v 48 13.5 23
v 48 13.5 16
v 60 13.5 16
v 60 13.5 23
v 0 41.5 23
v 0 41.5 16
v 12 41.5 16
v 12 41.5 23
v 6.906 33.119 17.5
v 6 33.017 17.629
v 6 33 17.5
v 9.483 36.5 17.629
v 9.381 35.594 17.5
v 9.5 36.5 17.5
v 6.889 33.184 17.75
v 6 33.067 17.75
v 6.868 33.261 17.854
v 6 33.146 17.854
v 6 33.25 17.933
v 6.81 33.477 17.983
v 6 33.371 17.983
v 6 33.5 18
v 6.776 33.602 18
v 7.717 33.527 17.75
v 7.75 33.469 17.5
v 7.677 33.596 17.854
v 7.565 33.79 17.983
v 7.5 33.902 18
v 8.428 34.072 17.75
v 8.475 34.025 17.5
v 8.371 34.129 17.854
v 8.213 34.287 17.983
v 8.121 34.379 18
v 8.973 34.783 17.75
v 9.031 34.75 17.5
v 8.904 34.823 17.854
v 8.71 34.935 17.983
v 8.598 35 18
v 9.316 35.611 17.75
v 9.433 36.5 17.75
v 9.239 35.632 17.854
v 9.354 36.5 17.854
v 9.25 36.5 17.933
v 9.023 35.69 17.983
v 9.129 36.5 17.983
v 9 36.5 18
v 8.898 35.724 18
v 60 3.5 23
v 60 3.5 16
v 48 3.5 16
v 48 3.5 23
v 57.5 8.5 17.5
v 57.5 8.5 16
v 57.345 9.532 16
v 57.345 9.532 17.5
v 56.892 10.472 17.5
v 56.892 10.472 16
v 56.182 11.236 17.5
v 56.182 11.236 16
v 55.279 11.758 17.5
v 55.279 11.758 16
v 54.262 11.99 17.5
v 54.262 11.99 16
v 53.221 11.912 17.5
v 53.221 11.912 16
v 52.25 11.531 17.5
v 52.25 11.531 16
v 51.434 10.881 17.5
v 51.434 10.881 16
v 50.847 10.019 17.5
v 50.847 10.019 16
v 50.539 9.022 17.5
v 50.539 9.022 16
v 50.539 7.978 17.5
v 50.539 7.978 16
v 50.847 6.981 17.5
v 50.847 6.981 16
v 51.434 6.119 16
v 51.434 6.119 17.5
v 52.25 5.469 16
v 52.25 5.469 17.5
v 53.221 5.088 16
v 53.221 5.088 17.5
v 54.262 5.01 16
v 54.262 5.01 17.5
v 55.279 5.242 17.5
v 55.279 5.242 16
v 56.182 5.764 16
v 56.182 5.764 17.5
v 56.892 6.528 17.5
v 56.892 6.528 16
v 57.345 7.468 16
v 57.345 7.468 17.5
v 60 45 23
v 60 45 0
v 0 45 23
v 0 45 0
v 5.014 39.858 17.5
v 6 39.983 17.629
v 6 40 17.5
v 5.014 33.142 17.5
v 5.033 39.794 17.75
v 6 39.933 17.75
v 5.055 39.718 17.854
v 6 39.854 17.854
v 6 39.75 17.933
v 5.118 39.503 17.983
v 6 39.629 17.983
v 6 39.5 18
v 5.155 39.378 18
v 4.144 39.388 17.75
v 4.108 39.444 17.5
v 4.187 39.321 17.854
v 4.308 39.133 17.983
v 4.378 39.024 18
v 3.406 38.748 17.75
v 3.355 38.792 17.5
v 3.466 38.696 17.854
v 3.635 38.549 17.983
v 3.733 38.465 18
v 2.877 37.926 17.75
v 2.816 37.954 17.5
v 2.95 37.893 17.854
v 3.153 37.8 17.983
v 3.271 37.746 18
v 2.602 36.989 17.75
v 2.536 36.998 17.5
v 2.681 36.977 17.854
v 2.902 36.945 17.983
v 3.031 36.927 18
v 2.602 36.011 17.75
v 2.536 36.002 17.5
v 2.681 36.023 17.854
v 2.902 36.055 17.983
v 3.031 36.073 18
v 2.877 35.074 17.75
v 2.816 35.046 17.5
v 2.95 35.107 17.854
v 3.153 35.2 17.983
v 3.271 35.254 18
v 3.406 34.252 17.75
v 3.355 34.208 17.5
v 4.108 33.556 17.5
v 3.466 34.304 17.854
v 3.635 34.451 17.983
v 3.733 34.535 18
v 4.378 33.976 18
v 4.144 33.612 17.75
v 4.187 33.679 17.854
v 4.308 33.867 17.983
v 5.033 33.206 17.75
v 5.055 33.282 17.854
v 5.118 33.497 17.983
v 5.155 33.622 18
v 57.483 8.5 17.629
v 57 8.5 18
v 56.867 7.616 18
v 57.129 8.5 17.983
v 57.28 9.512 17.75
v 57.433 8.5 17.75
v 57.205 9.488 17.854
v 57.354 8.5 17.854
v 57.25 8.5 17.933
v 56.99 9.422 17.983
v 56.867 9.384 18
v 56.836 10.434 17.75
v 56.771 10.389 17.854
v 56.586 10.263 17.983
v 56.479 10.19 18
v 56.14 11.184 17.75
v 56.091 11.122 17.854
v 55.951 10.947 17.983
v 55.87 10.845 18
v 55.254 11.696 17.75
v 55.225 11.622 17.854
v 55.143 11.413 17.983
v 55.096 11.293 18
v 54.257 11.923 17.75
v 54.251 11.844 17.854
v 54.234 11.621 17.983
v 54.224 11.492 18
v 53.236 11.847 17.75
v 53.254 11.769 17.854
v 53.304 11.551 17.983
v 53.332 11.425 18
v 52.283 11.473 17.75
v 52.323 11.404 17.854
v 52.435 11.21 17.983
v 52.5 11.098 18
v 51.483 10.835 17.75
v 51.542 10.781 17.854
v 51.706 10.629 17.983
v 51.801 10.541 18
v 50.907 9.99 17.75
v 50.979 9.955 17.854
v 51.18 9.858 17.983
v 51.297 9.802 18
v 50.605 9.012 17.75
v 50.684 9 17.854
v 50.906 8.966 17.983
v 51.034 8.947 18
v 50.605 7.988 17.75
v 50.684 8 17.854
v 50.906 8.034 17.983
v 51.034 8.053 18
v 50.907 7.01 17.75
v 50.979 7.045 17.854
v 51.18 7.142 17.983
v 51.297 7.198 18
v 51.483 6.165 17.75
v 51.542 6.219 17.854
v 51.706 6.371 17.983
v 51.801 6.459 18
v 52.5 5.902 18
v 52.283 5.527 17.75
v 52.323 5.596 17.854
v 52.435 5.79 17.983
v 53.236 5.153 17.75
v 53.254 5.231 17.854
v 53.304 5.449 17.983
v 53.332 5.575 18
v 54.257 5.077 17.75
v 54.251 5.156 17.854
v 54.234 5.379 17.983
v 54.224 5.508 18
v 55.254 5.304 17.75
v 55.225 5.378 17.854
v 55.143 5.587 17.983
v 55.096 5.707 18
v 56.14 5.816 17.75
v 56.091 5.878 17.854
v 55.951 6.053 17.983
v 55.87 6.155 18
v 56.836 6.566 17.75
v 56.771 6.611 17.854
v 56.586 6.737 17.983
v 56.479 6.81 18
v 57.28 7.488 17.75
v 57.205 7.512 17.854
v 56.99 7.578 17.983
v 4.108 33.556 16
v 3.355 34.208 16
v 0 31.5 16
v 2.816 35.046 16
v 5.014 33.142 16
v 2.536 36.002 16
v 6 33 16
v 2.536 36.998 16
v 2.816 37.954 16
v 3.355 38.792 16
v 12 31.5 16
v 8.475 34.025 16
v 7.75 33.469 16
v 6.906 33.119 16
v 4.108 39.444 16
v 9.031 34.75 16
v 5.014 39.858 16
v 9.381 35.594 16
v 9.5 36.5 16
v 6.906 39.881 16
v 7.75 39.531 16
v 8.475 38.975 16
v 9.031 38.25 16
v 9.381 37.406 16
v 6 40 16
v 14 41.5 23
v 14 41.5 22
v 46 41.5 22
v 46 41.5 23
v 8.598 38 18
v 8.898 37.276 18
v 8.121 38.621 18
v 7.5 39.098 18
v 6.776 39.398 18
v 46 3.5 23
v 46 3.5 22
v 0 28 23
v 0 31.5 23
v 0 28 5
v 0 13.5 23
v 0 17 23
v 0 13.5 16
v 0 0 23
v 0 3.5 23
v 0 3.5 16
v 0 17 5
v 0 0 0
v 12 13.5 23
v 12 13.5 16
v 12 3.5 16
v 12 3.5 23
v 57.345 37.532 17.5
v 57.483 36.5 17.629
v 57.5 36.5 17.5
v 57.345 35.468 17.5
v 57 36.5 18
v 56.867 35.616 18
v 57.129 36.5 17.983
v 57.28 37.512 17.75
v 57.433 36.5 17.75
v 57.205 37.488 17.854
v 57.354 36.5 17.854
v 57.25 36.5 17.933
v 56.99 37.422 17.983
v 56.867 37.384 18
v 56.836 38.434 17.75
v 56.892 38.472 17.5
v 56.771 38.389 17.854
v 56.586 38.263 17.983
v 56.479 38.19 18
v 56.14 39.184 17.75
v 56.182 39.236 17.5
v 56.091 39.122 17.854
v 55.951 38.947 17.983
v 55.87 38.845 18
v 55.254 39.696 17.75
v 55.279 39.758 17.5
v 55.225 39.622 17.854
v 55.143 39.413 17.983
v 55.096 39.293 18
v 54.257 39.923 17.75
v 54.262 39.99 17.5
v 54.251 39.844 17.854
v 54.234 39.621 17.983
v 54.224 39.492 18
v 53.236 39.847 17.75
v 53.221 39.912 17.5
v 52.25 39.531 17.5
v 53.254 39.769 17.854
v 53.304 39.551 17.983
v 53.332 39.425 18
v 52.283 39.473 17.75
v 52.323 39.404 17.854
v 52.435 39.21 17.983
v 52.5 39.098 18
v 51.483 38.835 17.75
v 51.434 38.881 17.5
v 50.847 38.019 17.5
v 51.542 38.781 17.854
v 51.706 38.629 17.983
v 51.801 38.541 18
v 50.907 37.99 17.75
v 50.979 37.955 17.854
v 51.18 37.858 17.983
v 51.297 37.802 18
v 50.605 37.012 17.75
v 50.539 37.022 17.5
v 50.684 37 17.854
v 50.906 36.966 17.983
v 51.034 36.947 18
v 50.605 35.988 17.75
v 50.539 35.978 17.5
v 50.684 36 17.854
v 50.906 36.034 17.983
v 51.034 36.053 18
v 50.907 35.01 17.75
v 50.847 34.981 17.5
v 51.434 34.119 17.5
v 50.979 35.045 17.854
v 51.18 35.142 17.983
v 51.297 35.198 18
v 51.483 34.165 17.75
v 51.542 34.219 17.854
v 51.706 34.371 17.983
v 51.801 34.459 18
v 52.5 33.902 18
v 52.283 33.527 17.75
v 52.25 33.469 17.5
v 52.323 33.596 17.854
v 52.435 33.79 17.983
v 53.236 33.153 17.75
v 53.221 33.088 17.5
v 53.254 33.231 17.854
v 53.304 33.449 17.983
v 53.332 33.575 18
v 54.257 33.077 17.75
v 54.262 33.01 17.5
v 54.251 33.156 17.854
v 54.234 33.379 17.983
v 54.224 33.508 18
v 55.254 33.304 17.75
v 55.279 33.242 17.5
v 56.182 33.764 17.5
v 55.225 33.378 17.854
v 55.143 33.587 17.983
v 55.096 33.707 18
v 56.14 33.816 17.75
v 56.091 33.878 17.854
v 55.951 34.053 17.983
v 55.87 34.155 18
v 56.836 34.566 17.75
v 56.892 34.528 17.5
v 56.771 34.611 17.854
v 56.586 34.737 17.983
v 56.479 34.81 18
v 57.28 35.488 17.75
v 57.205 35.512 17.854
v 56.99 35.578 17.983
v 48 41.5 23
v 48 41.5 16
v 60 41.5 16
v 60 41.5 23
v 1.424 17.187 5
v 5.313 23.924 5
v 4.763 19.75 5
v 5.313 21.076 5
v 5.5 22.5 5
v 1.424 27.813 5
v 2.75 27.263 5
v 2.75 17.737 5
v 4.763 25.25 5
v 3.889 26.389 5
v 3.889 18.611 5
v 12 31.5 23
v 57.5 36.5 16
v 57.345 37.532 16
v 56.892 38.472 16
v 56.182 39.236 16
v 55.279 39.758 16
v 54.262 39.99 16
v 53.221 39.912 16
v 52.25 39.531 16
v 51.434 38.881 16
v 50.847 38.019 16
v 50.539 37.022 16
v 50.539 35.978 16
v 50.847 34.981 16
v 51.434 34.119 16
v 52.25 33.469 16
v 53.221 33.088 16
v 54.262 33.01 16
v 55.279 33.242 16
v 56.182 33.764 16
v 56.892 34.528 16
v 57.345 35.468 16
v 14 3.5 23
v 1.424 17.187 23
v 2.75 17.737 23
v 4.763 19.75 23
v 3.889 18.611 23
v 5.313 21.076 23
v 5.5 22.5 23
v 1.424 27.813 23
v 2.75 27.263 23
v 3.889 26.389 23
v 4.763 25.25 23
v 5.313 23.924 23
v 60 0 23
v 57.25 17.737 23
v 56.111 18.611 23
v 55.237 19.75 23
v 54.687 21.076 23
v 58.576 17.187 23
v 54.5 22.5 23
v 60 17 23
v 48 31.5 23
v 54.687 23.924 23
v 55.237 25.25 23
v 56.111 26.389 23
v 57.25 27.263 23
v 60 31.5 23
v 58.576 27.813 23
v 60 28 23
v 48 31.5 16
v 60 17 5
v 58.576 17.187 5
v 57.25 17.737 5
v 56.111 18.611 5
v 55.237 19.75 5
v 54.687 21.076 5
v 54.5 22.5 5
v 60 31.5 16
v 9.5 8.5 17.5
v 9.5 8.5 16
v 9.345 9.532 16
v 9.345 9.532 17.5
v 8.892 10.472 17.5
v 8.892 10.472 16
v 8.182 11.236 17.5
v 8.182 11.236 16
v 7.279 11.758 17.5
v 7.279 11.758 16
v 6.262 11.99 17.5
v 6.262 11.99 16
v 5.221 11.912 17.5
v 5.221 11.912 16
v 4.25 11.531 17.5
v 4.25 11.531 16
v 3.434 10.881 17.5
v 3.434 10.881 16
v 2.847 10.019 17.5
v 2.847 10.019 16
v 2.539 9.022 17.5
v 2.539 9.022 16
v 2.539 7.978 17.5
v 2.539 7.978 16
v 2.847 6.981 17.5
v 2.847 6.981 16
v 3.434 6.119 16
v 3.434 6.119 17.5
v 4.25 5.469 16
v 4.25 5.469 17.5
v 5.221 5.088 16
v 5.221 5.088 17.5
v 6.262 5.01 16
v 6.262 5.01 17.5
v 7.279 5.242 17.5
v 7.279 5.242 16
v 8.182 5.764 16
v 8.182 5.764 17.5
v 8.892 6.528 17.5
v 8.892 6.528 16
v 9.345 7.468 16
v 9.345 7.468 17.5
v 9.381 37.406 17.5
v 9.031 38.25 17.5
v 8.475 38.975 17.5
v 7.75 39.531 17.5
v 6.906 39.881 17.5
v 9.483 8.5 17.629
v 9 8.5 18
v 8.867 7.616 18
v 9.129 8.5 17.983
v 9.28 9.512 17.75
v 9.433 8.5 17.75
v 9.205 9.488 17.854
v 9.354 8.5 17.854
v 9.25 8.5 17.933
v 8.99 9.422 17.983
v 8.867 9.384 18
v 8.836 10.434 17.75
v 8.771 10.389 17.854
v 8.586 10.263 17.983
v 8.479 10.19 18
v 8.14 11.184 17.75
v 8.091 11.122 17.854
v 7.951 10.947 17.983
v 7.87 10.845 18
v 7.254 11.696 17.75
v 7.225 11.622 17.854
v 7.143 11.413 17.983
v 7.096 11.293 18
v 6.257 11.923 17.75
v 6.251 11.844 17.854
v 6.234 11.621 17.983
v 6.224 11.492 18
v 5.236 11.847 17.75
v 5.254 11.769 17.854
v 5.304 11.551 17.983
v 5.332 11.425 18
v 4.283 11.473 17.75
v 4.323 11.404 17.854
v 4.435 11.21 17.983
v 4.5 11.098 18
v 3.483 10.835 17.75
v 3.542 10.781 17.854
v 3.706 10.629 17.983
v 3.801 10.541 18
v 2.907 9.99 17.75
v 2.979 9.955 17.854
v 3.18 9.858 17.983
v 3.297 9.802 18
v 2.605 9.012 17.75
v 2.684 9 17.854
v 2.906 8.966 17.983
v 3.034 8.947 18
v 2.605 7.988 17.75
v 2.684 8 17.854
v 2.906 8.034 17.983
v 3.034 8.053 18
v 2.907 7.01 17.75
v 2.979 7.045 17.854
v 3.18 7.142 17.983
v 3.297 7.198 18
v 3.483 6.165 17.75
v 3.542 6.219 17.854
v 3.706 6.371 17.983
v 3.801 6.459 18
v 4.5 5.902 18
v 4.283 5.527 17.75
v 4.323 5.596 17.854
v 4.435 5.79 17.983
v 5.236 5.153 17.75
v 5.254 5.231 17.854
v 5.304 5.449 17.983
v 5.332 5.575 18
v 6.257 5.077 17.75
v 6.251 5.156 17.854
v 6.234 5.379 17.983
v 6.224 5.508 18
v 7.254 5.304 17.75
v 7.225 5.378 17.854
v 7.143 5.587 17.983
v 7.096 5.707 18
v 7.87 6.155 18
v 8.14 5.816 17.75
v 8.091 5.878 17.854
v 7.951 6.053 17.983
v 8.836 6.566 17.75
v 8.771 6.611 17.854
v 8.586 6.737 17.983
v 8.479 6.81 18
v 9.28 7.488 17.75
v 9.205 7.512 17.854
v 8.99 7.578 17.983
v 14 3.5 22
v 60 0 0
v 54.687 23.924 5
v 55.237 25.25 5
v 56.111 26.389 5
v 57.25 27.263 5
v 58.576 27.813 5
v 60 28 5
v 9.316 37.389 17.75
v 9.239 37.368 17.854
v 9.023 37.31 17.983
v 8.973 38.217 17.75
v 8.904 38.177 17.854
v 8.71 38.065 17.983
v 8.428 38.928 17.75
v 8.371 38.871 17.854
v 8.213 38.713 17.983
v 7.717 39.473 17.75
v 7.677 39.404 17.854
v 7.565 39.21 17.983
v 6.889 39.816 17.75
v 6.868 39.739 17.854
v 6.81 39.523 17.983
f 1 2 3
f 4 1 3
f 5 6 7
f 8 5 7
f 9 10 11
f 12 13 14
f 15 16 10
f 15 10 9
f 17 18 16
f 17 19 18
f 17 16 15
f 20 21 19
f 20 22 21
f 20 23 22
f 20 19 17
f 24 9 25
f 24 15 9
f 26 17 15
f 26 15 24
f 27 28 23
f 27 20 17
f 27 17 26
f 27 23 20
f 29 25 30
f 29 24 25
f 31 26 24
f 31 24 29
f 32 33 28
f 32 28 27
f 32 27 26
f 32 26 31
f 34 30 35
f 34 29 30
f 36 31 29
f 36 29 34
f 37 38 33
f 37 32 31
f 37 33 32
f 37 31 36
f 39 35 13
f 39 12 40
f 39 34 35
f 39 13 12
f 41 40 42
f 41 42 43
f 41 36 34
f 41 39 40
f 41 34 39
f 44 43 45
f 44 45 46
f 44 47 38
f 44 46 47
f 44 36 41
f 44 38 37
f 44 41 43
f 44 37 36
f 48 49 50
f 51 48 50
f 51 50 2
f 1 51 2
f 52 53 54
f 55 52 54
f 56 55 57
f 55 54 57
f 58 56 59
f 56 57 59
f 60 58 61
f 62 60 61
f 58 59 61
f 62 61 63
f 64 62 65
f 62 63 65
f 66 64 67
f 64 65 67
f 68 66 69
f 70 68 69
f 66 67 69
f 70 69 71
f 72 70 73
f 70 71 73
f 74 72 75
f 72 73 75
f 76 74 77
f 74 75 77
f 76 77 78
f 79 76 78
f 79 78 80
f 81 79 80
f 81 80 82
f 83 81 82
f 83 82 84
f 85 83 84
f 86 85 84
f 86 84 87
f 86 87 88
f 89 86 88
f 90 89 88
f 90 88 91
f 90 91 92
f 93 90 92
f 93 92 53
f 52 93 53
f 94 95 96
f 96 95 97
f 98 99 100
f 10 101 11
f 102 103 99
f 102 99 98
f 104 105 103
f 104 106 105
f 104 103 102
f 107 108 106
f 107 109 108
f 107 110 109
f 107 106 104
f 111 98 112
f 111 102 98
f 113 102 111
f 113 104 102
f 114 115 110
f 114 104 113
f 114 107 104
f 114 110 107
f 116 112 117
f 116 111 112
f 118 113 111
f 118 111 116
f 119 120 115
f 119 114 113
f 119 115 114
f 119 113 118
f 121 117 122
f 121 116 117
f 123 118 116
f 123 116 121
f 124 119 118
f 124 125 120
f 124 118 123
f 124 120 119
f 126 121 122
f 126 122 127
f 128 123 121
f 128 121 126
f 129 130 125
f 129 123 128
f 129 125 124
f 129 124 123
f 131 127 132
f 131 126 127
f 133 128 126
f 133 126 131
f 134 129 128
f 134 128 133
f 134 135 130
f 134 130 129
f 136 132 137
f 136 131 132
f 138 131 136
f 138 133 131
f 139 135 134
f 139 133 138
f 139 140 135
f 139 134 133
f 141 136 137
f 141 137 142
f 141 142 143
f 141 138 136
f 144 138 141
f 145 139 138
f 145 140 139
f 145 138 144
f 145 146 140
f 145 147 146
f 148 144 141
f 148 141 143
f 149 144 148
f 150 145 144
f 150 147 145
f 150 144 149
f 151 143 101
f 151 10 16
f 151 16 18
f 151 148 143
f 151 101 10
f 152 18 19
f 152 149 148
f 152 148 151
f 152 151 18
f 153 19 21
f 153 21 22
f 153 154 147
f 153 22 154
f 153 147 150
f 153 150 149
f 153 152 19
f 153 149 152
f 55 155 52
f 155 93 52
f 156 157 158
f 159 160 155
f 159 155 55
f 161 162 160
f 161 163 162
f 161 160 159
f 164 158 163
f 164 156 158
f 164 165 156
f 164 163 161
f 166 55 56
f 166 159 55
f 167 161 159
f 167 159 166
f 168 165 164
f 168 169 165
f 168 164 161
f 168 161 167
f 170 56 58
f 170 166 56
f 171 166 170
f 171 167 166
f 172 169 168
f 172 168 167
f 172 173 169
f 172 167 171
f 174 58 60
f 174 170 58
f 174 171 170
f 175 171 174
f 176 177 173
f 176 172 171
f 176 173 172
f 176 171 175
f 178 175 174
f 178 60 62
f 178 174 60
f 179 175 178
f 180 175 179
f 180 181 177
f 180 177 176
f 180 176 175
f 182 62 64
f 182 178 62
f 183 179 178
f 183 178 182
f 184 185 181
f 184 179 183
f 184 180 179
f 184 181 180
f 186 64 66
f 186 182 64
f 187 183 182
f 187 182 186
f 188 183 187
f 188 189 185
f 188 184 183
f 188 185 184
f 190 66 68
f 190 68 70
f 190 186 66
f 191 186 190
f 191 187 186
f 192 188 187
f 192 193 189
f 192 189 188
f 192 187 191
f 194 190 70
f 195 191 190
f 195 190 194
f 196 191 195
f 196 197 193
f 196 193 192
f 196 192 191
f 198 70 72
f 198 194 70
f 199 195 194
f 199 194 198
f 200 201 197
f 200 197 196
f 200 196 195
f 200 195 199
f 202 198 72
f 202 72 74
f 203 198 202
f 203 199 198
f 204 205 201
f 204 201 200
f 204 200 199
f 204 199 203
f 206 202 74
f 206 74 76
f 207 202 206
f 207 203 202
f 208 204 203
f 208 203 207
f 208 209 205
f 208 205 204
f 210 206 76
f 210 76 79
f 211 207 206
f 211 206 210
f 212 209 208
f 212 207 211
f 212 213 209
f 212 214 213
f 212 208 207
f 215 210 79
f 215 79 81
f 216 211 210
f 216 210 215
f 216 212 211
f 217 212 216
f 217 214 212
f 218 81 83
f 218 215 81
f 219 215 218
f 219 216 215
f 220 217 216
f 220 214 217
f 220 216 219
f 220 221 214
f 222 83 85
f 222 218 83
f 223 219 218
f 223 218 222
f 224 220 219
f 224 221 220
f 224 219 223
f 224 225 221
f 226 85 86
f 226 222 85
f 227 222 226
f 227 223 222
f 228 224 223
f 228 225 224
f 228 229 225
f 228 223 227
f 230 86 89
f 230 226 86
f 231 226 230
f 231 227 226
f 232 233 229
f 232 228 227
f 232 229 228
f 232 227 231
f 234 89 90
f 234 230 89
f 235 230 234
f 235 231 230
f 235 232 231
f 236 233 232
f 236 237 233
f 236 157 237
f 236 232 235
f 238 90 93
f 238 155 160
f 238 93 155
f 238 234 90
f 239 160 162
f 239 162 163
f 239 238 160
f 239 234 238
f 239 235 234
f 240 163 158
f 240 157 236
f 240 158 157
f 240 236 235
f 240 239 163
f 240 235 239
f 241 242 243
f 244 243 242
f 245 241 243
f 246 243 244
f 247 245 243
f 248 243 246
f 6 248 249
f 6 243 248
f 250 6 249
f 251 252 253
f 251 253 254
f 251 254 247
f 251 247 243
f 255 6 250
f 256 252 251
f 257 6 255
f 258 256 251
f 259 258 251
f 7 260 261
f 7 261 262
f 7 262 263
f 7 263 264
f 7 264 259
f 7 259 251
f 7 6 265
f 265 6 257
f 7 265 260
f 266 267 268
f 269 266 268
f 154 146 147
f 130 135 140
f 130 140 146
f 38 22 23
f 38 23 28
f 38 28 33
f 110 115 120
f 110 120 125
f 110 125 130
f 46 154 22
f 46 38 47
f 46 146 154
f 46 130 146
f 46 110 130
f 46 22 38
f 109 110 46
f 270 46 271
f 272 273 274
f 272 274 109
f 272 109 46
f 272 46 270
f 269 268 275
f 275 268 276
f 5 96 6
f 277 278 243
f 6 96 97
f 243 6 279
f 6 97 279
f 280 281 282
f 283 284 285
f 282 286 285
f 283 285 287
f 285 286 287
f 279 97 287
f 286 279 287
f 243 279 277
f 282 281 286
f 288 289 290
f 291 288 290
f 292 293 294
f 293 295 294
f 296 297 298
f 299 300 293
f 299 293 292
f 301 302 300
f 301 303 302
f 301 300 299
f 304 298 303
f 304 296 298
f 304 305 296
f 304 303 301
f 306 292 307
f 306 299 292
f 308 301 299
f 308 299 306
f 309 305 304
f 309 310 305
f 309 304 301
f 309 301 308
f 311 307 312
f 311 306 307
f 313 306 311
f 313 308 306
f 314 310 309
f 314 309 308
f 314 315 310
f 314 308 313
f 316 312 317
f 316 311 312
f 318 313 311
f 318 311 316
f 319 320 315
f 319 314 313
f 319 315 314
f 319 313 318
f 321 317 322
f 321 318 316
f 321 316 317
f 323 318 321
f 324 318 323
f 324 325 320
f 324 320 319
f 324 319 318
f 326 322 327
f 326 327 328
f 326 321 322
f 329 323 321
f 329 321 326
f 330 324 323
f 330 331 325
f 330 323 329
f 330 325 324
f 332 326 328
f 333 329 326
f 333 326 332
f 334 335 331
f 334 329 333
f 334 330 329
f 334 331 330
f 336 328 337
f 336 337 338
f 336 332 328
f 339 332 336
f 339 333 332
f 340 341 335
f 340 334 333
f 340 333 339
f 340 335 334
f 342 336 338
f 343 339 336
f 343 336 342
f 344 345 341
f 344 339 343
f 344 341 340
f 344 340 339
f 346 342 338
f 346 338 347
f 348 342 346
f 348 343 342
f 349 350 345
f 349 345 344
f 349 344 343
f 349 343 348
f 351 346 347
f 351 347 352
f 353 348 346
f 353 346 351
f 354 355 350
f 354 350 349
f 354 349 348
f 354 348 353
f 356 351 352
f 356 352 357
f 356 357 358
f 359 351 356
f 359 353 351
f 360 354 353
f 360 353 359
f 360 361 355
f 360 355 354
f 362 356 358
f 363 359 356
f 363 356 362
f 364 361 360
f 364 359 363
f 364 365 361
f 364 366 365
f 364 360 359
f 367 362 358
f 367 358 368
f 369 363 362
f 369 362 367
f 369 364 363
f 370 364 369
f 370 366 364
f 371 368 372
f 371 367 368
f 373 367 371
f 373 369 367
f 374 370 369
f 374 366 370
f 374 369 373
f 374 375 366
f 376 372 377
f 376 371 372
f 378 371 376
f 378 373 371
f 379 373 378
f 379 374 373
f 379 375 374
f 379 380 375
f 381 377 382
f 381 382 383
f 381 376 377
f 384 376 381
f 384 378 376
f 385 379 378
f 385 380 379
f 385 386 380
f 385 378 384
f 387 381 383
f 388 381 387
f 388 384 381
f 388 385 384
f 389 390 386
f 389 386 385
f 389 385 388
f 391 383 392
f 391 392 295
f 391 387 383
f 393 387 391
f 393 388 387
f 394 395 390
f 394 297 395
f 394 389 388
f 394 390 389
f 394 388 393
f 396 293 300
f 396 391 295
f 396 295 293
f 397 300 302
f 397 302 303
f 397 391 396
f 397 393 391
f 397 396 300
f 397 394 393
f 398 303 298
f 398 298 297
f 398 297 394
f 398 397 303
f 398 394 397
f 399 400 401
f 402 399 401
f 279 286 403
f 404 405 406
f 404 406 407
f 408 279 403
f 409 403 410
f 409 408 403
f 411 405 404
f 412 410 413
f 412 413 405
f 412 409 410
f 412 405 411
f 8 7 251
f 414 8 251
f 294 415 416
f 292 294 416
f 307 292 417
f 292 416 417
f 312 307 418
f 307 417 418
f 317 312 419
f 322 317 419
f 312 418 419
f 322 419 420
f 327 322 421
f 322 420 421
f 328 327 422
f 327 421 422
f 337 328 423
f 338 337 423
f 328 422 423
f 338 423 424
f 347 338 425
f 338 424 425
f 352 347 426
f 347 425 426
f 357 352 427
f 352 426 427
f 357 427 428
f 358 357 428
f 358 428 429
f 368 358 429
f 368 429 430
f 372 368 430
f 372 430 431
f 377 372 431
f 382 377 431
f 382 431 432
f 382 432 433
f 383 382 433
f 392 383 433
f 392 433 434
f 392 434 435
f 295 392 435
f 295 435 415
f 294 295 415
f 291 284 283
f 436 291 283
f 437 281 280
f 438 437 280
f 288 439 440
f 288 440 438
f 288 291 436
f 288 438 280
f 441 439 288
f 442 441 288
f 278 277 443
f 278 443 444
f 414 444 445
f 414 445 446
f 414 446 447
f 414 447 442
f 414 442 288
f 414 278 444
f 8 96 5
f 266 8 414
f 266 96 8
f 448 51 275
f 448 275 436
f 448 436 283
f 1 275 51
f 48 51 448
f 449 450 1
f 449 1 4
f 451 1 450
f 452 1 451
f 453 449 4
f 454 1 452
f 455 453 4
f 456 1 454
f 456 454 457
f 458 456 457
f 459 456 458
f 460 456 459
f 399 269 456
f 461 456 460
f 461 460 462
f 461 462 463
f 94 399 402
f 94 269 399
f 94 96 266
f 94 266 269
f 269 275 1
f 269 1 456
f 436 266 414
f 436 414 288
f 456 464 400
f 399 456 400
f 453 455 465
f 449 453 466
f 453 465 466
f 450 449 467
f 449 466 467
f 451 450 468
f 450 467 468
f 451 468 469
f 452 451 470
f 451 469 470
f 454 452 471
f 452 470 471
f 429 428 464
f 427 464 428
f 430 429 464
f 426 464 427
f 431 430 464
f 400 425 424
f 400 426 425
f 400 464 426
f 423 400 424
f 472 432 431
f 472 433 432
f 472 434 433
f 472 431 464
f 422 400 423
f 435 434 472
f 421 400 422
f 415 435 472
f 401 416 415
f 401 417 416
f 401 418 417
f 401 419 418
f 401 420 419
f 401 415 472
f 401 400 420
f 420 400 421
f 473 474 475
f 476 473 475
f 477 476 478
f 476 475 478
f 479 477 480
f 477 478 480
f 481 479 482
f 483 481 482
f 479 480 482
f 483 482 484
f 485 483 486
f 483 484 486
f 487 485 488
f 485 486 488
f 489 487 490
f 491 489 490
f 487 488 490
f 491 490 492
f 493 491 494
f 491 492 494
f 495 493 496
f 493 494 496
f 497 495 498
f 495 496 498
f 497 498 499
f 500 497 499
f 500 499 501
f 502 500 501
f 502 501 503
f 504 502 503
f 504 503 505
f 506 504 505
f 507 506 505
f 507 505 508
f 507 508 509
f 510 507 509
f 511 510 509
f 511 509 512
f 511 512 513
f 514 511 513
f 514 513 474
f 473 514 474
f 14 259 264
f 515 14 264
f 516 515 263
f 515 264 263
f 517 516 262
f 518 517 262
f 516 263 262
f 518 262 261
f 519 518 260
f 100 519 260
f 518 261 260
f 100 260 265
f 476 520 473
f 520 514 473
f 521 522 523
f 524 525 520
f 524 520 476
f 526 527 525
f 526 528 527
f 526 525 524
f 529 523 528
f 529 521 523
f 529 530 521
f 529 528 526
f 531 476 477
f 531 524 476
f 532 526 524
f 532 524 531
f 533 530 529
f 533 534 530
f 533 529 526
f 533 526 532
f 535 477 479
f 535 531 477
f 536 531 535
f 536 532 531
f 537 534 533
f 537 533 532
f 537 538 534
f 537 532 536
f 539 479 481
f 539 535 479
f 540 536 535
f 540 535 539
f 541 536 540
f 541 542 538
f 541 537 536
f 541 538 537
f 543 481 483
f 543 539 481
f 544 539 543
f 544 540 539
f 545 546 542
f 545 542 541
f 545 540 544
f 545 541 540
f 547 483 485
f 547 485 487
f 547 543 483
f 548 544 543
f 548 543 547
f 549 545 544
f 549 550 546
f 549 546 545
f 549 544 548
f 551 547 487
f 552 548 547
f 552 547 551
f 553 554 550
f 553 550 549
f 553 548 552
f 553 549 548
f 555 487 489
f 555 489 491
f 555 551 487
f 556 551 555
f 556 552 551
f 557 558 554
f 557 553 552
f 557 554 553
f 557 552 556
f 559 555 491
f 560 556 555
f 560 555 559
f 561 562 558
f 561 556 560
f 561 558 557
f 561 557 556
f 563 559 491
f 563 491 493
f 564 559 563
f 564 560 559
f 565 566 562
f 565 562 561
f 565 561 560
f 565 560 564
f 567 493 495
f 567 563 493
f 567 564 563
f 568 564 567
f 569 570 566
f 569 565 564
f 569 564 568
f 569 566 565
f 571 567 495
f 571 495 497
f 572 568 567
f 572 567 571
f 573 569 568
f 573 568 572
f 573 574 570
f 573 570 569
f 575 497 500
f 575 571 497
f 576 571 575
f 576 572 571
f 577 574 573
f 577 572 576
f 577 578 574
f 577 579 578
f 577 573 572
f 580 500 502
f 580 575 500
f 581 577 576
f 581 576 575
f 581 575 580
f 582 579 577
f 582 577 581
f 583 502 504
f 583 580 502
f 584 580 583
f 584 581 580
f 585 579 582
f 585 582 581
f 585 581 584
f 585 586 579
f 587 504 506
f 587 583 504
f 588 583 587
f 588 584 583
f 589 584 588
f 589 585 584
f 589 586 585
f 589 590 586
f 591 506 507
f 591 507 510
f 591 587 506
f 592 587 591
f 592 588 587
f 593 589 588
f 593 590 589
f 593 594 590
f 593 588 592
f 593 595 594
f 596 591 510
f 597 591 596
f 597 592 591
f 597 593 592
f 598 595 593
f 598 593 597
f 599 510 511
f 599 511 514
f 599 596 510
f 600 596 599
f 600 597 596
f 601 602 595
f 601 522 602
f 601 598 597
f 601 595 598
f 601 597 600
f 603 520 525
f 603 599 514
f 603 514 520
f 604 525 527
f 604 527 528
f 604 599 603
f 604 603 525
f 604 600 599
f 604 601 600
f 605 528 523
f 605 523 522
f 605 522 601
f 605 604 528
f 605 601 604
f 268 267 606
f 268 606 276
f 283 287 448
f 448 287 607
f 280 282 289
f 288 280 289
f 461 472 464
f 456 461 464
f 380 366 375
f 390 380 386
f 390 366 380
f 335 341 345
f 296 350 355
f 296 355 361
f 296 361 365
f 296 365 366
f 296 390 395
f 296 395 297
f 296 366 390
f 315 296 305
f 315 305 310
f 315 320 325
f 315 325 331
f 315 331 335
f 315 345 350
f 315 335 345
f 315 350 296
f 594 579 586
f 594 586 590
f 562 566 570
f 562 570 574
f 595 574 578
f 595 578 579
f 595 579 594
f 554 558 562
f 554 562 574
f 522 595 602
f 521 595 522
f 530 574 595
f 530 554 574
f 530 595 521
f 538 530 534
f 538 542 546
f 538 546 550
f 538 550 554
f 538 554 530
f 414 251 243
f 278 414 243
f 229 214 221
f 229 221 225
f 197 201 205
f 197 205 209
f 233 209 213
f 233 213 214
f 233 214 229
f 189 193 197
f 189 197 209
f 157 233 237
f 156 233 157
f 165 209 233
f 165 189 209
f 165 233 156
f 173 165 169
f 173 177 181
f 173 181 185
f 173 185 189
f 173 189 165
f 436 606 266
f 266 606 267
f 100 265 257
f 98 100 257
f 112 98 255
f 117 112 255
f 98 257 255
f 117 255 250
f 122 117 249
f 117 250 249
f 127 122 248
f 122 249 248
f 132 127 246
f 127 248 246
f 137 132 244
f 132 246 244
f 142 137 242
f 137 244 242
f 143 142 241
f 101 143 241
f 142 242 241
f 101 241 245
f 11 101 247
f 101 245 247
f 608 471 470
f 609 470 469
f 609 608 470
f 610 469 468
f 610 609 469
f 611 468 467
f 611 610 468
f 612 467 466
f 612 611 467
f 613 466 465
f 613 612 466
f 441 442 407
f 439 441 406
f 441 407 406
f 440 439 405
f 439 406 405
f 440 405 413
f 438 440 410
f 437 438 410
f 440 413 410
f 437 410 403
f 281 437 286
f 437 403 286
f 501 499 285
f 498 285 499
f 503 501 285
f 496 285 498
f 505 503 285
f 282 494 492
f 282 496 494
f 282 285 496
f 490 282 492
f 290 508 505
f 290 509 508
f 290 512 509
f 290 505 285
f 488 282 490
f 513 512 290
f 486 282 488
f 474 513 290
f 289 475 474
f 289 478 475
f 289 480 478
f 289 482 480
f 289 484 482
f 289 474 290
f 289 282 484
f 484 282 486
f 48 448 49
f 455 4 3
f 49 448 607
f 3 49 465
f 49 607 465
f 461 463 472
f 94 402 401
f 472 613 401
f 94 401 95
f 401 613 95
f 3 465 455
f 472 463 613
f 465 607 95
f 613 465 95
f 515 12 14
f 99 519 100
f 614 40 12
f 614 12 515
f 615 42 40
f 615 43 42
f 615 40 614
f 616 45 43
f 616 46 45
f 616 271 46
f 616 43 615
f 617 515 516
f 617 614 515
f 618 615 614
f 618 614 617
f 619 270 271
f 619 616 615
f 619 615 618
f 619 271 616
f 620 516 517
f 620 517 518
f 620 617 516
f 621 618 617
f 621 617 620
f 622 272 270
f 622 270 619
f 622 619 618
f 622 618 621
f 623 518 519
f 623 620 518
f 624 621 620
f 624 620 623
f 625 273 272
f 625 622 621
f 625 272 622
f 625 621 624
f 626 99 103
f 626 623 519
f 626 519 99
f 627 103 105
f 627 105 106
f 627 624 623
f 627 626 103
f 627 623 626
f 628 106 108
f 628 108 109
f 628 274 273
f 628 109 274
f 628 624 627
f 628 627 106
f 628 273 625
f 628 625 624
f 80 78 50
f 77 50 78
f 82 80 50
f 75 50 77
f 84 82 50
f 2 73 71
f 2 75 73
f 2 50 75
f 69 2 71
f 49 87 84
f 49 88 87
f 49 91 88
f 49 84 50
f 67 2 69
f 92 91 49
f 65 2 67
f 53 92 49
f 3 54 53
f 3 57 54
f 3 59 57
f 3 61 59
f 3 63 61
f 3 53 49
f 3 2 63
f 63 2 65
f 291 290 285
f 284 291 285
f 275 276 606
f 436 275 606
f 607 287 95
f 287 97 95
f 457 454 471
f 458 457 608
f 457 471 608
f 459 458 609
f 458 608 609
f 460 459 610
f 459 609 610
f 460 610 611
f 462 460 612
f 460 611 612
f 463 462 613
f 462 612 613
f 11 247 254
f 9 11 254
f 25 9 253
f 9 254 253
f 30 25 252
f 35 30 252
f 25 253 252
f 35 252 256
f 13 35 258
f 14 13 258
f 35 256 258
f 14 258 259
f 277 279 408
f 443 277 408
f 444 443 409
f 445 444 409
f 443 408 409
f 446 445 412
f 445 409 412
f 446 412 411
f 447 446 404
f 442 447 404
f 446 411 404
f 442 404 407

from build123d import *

# Parameters (mm, degrees)
F1_DEPTH = 23
F2_DEPTH = 22
F0_W     = 12
F0_H     = 10
F0_R     = 3.5
F3_DEPTH = 16
F4_DEPTH = 18
F5_R     = 0.5
F6_DEPTH = 5


with BuildPart() as f1:
    # F0 (on Top) → F1 (new body)
    with BuildSketch(Plane.XY):
        with BuildLine():
            Line((60, 45), (30, 45))
            Line((30, 45), (30, 41.5))
            Line((30, 41.5), (46, 41.5))
            Line((46, 41.5), (46, 31.5))
            Line((46, 31.5), (46, 22.5))
            Line((46, 22.5), (54.5, 22.5))
            ThreePointArc((54.5, 22.5), (56.1109127035, 26.3890872965), (60, 28))
            Line((60, 28), (60, 31.5))
            Line((60, 31.5), (48, 31.5))
            Line((48, 31.5), (48, 41.5))
            Line((48, 41.5), (60, 41.5))
            Line((60, 41.5), (60, 45))
        make_face()
        with BuildLine():
            Line((54.5, 22.5), (46, 22.5))
            Line((46, 22.5), (46, 13.5))
            Line((46, 13.5), (46, 3.5))
            Line((46, 3.5), (30, 3.5))
            Line((30, 3.5), (30, 0))
            Line((30, 0), (60, 0))
            Line((60, 0), (60, 3.5))
            Line((60, 3.5), (48, 3.5))
            Line((48, 3.5), (48, 13.5))
            Line((48, 13.5), (60, 13.5))
            Line((60, 13.5), (60, 17))
            ThreePointArc((60, 17), (56.1109127035, 18.6109127035), (54.5, 22.5))
        make_face()
        with BuildLine():
            Line((14, 13.5), (14, 22.5))
            Line((14, 22.5), (5.5, 22.5))
            ThreePointArc((5.5, 22.5), (3.8890872965, 18.6109127035), (0, 17))
            Line((0, 17), (0, 13.5))
            Line((0, 13.5), (12, 13.5))
            Line((12, 13.5), (12, 3.5))
            Line((12, 3.5), (0, 3.5))
            Line((0, 3.5), (0, 0))
            Line((0, 0), (30, 0))
            Line((30, 0), (30, 3.5))
            Line((30, 3.5), (14, 3.5))
            Line((14, 3.5), (14, 13.5))
        make_face()
        with BuildLine():
            Line((30, 45), (0, 45))
            Line((0, 45), (0, 41.5))
            Line((0, 41.5), (6, 41.5))
            Line((6, 41.5), (12, 41.5))
            Line((12, 41.5), (12, 31.5))
            Line((12, 31.5), (6, 31.5))
            Line((6, 31.5), (0, 31.5))
            Line((0, 31.5), (0, 28))
            ThreePointArc((0, 28), (3.8890872965, 26.3890872965), (5.5, 22.5))
            Line((5.5, 22.5), (14, 22.5))
            Line((14, 22.5), (14, 31.5))
            Line((14, 31.5), (14, 41.5))
            Line((14, 41.5), (30, 41.5))
            Line((30, 41.5), (30, 45))
        make_face()
    extrude(amount=F1_DEPTH)

    # F0 (on Top) → F2 (join)
    with BuildSketch(Plane.XY):
        Polygon((30, 22.5), (30, 41.5), (14, 41.5), (14, 31.5), (14, 22.5), align=None)
        Polygon((46, 41.5), (30, 41.5), (30, 22.5), (46, 22.5), (46, 31.5), align=None)
        Polygon((46, 22.5), (30, 22.5), (30, 3.5), (46, 3.5), (46, 13.5), align=None)
        Polygon((30, 3.5), (30, 22.5), (14, 22.5), (14, 13.5), (14, 3.5), align=None)
    extrude(amount=F2_DEPTH)

    # F0 (on Top) → F3 (join)
    with BuildSketch(Plane.XY):
        with BuildLine():
            Line((6, 41.5), (0, 41.5))
            Line((0, 41.5), (0, 31.5))
            Line((0, 31.5), (6, 31.5))
            Line((6, 31.5), (6, 33))
            ThreePointArc((6, 33), (2.5, 36.5), (6, 40))
            Line((6, 40), (6, 41.5))
        make_face()
        with BuildLine():
            Line((12, 41.5), (6, 41.5))
            Line((6, 41.5), (6, 40))
            ThreePointArc((6, 40), (8.4748737342, 38.9748737342), (9.5, 36.5))
            ThreePointArc((9.5, 36.5), (8.4748737342, 34.0251262658), (6, 33))
            Line((6, 33), (6, 31.5))
            Line((6, 31.5), (12, 31.5))
            Line((12, 31.5), (12, 41.5))
        make_face()
        with Locations((6, 8.5)):
            Rectangle(F0_W, F0_H)
        with Locations((6, 8.5)):
            Circle(F0_R, mode=Mode.SUBTRACT)
        with Locations((54, 36.5)):
            Rectangle(F0_W, F0_H)
        with Locations((54, 36.5)):
            Circle(F0_R, mode=Mode.SUBTRACT)
        with Locations((54, 8.5)):
            Rectangle(F0_W, F0_H)
        with Locations((54, 8.5)):
            Circle(F0_R, mode=Mode.SUBTRACT)
    extrude(amount=F3_DEPTH)

    # F0 (on Top) → F4 (join)
    with BuildSketch(Plane.XY):
        with BuildLine():
            ThreePointArc((9.5, 36.5), (8.4748737342, 38.9748737342), (6, 40))
            Line((6, 40), (6, 33))
            ThreePointArc((6, 33), (8.4748737342, 34.0251262658), (9.5, 36.5))
        make_face()
        with BuildLine():
            Line((6, 33), (6, 40))
            ThreePointArc((6, 40), (2.5, 36.5), (6, 33))
        make_face()
        with Locations((6, 8.5)):
            Circle(F0_R)
        with Locations((54, 36.5)):
            Circle(F0_R)
        with Locations((54, 8.5)):
            Circle(F0_R)
    extrude(amount=F4_DEPTH)

    # F5
    f5_edges = [f1.edges().sort_by_distance(p)[0] for p in [
        (2.5, 36.5, 18),
        (2.5, 8.5, 18),
        (50.5, 36.5, 18),
        (50.5, 8.5, 18),
    ]]
    fillet(f5_edges, radius=F5_R)

    # F0 (on Top) → F6 (join)
    with BuildSketch(Plane.XY):
        with BuildLine():
            ThreePointArc((5.5, 22.5), (3.8890872965, 26.3890872965), (0, 28))
            Line((0, 28), (0, 22.5))
            Line((0, 22.5), (5.5, 22.5))
        make_face()
        with BuildLine():
            Line((5.5, 22.5), (0, 22.5))
            Line((0, 22.5), (0, 17))
            ThreePointArc((0, 17), (3.8890872965, 18.6109127035), (5.5, 22.5))
        make_face()
        with BuildLine():
            Line((60, 22.5), (60, 28))
            ThreePointArc((60, 28), (56.1109127035, 26.3890872965), (54.5, 22.5))
            Line((54.5, 22.5), (60, 22.5))
        make_face()
        with BuildLine():
            Line((60, 22.5), (54.5, 22.5))
            ThreePointArc((54.5, 22.5), (56.1109127035, 18.6109127035), (60, 17))
            Line((60, 17), (60, 22.5))
        make_face()
    extrude(amount=F6_DEPTH)


solid = f1.part
